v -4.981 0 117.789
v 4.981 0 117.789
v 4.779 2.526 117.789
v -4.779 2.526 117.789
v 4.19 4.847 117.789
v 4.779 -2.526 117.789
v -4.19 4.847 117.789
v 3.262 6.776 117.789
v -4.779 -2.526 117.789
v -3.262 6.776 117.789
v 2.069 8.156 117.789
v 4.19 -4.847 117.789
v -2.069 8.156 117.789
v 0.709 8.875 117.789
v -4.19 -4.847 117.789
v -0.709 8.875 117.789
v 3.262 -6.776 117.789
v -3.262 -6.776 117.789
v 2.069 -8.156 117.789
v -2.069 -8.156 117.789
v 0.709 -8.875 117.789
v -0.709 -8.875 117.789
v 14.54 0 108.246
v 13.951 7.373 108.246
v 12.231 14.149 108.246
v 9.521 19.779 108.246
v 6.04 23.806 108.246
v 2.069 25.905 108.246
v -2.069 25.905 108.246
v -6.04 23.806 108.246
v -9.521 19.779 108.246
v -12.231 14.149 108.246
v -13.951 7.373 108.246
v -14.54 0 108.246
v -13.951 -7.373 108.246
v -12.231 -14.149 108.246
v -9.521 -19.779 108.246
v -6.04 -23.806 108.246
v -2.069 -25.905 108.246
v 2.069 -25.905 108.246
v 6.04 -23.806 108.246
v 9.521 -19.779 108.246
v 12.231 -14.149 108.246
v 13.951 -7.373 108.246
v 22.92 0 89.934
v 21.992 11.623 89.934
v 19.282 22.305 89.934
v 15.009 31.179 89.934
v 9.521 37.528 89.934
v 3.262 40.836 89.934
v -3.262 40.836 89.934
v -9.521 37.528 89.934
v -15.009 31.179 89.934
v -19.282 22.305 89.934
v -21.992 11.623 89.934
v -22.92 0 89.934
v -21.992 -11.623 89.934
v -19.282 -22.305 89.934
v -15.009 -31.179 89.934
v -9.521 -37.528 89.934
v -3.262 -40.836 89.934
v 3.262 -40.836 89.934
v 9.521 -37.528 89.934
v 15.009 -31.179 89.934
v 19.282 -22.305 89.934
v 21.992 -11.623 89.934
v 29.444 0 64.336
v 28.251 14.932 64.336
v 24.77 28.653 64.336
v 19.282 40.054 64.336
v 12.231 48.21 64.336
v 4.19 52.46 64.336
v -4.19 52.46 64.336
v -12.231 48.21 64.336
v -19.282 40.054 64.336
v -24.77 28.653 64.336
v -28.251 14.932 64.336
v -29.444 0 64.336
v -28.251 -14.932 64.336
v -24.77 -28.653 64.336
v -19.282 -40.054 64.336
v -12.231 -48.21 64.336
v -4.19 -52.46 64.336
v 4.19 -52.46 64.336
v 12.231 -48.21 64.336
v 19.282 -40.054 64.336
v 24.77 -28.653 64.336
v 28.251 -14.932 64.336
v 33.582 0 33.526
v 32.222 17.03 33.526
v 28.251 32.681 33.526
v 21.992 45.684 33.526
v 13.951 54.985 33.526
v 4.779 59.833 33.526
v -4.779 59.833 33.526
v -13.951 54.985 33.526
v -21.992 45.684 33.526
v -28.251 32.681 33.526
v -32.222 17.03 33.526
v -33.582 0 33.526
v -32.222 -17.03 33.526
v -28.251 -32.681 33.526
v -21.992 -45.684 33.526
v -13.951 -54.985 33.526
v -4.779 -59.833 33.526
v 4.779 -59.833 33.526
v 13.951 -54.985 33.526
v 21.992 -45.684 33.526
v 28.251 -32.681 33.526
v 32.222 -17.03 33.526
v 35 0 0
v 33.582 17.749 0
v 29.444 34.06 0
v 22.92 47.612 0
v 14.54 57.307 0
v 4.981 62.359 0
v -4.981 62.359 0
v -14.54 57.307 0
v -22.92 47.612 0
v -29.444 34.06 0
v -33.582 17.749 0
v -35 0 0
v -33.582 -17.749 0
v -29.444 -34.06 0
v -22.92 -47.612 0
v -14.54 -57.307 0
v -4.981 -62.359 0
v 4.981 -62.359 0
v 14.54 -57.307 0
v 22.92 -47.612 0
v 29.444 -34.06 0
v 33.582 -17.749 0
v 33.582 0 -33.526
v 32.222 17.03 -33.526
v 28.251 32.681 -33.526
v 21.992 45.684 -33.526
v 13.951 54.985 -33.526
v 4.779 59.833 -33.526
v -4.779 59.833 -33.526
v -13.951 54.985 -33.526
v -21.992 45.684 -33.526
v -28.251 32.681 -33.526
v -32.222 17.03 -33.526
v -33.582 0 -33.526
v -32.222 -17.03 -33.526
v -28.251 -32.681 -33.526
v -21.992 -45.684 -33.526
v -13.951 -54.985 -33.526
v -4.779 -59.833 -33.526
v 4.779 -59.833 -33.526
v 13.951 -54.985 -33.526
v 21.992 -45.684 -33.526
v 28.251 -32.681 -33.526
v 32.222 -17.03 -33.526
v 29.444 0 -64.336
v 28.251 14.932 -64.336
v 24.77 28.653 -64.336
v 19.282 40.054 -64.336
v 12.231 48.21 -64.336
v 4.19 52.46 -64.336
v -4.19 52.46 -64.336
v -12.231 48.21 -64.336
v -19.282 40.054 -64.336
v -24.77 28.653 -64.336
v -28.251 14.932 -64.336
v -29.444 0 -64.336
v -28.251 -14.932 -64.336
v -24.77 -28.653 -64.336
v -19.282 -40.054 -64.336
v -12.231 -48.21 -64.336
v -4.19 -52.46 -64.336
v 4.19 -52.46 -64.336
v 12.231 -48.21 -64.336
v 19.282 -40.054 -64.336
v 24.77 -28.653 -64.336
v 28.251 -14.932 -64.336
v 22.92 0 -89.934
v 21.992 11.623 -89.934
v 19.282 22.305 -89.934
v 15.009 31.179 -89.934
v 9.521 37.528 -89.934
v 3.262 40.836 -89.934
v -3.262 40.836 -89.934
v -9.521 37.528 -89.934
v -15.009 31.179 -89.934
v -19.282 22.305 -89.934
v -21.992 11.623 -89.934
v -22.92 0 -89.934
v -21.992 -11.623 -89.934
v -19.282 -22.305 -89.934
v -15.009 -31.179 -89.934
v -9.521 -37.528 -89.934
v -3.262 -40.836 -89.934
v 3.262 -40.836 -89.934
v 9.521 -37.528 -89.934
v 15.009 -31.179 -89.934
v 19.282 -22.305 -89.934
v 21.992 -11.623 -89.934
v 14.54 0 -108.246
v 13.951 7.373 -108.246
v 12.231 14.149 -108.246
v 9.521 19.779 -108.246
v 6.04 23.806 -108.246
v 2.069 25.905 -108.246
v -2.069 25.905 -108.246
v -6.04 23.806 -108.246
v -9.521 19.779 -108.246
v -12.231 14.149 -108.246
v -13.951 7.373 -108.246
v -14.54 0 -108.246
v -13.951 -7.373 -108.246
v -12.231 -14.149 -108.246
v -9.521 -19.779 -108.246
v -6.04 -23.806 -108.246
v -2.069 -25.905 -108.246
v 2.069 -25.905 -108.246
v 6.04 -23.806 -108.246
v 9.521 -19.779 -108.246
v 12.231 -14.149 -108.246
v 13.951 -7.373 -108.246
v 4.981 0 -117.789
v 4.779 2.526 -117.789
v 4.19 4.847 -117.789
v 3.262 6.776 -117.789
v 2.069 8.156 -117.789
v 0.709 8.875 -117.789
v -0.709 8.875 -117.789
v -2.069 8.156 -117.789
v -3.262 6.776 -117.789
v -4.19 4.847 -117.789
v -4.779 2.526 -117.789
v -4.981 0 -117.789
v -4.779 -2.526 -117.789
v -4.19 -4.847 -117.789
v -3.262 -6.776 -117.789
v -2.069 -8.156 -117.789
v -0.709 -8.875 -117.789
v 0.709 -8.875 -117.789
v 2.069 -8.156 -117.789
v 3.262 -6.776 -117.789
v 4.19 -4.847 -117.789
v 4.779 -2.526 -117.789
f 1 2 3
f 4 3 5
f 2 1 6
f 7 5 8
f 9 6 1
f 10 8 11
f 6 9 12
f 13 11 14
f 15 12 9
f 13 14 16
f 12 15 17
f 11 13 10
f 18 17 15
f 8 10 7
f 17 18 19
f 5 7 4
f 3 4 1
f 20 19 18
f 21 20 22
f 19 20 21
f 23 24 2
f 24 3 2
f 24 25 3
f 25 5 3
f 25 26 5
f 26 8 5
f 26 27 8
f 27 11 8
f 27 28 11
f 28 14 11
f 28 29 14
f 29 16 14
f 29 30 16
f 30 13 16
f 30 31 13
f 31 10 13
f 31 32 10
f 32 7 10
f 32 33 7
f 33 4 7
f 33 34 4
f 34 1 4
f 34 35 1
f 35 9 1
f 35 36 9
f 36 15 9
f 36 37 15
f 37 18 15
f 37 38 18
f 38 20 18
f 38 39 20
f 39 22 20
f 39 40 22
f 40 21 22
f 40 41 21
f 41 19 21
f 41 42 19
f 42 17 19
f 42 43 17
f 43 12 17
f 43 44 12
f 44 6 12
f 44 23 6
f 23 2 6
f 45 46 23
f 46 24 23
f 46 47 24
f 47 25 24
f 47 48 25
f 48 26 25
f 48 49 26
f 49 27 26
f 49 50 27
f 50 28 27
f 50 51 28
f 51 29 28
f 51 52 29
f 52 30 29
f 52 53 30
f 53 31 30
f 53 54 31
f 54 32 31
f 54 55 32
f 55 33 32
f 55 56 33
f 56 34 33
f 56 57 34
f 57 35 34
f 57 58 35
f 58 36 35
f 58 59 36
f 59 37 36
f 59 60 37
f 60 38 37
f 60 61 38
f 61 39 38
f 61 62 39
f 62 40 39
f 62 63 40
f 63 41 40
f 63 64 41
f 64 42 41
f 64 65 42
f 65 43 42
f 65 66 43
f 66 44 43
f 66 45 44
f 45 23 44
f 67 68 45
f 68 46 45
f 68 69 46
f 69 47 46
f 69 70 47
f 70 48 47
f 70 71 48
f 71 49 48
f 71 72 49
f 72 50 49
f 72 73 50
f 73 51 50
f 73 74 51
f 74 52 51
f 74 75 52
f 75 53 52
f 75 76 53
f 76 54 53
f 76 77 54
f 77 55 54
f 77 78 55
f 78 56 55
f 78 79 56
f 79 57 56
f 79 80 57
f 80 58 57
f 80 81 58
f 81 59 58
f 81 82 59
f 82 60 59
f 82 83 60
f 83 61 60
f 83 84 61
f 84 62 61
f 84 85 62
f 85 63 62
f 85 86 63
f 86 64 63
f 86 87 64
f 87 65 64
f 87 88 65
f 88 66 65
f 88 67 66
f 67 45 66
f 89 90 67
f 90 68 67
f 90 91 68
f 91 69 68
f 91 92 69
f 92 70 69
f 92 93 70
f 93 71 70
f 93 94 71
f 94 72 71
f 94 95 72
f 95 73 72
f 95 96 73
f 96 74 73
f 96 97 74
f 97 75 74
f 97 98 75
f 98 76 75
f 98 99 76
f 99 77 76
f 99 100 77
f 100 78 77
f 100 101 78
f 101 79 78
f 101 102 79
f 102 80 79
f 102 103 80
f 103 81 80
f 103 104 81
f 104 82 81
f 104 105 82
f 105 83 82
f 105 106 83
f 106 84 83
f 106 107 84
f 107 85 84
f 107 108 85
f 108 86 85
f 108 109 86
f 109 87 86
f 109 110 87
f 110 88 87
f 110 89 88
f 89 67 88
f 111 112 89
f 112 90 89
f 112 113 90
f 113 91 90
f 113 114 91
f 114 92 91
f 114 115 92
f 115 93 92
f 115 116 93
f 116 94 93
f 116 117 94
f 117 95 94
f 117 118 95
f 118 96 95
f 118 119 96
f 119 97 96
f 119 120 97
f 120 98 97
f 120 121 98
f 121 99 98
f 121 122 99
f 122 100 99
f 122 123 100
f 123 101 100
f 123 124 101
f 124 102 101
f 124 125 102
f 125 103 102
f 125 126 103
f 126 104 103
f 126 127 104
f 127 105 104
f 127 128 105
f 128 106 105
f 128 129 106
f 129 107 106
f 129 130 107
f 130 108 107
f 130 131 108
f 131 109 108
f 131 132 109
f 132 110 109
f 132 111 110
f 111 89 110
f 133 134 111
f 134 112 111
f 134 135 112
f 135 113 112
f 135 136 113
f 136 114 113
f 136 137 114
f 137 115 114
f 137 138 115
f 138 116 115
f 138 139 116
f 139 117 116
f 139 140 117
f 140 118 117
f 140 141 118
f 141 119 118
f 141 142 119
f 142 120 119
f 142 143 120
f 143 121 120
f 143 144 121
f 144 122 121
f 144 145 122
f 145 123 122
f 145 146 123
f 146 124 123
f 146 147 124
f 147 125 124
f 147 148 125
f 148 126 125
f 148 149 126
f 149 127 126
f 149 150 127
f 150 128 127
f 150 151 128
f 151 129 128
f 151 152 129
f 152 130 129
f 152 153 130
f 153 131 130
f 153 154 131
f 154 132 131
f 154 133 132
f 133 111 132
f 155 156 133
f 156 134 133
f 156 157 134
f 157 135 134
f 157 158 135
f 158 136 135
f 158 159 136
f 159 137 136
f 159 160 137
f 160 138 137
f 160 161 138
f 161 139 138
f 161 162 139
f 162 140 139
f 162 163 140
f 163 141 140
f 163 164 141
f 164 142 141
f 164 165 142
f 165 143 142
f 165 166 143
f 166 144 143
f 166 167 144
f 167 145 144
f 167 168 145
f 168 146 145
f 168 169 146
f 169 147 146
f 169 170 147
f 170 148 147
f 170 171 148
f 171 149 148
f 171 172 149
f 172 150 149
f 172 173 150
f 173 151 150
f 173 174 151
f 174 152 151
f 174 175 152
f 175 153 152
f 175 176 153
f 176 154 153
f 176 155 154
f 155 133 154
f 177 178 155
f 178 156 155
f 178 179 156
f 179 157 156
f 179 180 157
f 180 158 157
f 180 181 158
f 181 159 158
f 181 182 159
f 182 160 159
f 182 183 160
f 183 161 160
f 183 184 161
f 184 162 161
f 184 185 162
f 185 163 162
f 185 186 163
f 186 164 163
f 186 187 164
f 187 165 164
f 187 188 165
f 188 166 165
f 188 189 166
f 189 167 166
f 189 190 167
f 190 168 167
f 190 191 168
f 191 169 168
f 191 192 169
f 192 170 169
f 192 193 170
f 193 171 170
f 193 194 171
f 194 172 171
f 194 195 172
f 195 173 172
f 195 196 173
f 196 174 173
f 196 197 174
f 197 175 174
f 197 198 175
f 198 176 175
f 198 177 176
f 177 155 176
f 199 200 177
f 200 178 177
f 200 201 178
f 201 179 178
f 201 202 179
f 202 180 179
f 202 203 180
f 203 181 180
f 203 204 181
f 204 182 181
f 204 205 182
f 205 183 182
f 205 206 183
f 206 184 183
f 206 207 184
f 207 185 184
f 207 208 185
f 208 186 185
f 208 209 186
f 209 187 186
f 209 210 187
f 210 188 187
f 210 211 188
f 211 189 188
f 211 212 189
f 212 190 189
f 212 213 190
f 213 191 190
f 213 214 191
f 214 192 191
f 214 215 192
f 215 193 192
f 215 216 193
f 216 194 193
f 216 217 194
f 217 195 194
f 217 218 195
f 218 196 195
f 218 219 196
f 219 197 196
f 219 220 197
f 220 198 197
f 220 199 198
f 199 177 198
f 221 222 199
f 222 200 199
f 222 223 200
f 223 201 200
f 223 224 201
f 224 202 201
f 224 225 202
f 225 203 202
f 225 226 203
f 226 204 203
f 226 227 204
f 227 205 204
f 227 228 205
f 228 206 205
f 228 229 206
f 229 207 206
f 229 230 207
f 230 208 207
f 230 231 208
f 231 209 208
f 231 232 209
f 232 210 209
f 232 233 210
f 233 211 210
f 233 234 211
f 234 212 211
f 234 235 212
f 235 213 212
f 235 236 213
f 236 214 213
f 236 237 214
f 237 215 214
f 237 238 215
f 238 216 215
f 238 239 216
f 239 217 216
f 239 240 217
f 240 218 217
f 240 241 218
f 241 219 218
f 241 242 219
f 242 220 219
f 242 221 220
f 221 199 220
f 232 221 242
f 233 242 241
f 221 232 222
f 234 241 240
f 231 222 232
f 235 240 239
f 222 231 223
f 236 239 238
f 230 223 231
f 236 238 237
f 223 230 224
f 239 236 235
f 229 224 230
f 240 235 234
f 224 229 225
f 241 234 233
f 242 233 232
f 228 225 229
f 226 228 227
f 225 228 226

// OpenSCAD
// Generated by SolidPython 1.0.1 on 2020-07-29 00:46:46


scale(v = [5, 9, 17]) {
	sphere(r = 7);
}
/***********************************************
*********      SolidPython code:      **********
************************************************
 
# import packages: SolidPython
from solid import *
from solid.utils import *
from itertools import chain, combinations, permutations


class Resize:

    def __init__(self, scad_file):
        self.scad_file = scad_file
        #self.scad_file = import_scad(scad_file)
        # cone/cylinder param:
        self.r1 = 0
        self.r2 = 0
        self.h = 0
        # rectangular prism param:
        self.w = 0
        self.l = 0
        # ellipse param:
        self.r = 0

    # import OpenScad code (file name corresponds to shape)


    # classify shape + parameters
    def assign(self, param1, param2, param3):
        if self.scad_file == 'cone.scad':
            self.r1 = param1
            self.r2 = param2
            self.h = param3
        elif self.scad_file == 'cylinder.scad':
            self.r1 = param1
            self.r2 = param2
            self.h = param3
        elif self.scad_file == 'rectangularPrism.scad':
            self.h = param1
            self.l = param2
            self.w = param3
        else:
            self.r = param1
            self.h = param2

    # resize parameters
    def iterate(self):
        x = range(3, 20, 2)
        i = 1
        if self.scad_file == 'cone.scad':
            tempList = list(permutations(x, 2))
            for temp in tempList:
                param1 = temp[0]
                param2 = temp[1]
                filepath = 'produced_scad_files/' + 'cone' + str(param1) + '_' + str(param2) + '_' + '.scad'
                scad_render_to_file(cylinder(h=param1, r1=param2, r2=0), filepath)

        elif self.scad_file == 'cylinder.scad':
            tempList = list(permutations(x, 3))
            for temp in tempList:
                param1 = temp[0]
                param2 = temp[1]
                filepath = 'produced_scad_files/' + 'cylinder' + str(param1) + '_' + str(param2) + '_' + '.scad'
                scad_render_to_file(cylinder(h=param1, r1=param2, r2=param2), filepath)

        elif self.scad_file == 'rectangularPrism.scad':
            tempList = list(permutations(x, 3))
            for temp in tempList:
                param1 = temp[0]
                param2 = temp[1]
                param3 = temp[2]
                filepath = 'produced_scad_files/' + 'rectangularPrism' + str(param1) + '_' + str(param2) + '_' + str(
                    param3) + '.scad'
                scad_render_to_file(cube(size=(param1, param2, param3)), filepath)

        elif self.scad_file == 'ellipse.scad':
            tempList = list(permutations(x, 4))
            for temp in tempList:
                param1 = temp[0]
                param2 = temp[1]
                param3 = temp[2]
                param4 = temp[3]
                filepath = 'produced_scad_files/' + 'ellipse' + str(param1) + '_' + str(param2) + '_' + str(param3) + '_' + str(param4) + '.scad'
                scad_render_to_file(scale([param1, param2, param3])(sphere(r=param4)), filepath)

    def render_to_scadfile(self):
        scad_render_to_file(scad, 'example.scad') 
 
************************************************/
